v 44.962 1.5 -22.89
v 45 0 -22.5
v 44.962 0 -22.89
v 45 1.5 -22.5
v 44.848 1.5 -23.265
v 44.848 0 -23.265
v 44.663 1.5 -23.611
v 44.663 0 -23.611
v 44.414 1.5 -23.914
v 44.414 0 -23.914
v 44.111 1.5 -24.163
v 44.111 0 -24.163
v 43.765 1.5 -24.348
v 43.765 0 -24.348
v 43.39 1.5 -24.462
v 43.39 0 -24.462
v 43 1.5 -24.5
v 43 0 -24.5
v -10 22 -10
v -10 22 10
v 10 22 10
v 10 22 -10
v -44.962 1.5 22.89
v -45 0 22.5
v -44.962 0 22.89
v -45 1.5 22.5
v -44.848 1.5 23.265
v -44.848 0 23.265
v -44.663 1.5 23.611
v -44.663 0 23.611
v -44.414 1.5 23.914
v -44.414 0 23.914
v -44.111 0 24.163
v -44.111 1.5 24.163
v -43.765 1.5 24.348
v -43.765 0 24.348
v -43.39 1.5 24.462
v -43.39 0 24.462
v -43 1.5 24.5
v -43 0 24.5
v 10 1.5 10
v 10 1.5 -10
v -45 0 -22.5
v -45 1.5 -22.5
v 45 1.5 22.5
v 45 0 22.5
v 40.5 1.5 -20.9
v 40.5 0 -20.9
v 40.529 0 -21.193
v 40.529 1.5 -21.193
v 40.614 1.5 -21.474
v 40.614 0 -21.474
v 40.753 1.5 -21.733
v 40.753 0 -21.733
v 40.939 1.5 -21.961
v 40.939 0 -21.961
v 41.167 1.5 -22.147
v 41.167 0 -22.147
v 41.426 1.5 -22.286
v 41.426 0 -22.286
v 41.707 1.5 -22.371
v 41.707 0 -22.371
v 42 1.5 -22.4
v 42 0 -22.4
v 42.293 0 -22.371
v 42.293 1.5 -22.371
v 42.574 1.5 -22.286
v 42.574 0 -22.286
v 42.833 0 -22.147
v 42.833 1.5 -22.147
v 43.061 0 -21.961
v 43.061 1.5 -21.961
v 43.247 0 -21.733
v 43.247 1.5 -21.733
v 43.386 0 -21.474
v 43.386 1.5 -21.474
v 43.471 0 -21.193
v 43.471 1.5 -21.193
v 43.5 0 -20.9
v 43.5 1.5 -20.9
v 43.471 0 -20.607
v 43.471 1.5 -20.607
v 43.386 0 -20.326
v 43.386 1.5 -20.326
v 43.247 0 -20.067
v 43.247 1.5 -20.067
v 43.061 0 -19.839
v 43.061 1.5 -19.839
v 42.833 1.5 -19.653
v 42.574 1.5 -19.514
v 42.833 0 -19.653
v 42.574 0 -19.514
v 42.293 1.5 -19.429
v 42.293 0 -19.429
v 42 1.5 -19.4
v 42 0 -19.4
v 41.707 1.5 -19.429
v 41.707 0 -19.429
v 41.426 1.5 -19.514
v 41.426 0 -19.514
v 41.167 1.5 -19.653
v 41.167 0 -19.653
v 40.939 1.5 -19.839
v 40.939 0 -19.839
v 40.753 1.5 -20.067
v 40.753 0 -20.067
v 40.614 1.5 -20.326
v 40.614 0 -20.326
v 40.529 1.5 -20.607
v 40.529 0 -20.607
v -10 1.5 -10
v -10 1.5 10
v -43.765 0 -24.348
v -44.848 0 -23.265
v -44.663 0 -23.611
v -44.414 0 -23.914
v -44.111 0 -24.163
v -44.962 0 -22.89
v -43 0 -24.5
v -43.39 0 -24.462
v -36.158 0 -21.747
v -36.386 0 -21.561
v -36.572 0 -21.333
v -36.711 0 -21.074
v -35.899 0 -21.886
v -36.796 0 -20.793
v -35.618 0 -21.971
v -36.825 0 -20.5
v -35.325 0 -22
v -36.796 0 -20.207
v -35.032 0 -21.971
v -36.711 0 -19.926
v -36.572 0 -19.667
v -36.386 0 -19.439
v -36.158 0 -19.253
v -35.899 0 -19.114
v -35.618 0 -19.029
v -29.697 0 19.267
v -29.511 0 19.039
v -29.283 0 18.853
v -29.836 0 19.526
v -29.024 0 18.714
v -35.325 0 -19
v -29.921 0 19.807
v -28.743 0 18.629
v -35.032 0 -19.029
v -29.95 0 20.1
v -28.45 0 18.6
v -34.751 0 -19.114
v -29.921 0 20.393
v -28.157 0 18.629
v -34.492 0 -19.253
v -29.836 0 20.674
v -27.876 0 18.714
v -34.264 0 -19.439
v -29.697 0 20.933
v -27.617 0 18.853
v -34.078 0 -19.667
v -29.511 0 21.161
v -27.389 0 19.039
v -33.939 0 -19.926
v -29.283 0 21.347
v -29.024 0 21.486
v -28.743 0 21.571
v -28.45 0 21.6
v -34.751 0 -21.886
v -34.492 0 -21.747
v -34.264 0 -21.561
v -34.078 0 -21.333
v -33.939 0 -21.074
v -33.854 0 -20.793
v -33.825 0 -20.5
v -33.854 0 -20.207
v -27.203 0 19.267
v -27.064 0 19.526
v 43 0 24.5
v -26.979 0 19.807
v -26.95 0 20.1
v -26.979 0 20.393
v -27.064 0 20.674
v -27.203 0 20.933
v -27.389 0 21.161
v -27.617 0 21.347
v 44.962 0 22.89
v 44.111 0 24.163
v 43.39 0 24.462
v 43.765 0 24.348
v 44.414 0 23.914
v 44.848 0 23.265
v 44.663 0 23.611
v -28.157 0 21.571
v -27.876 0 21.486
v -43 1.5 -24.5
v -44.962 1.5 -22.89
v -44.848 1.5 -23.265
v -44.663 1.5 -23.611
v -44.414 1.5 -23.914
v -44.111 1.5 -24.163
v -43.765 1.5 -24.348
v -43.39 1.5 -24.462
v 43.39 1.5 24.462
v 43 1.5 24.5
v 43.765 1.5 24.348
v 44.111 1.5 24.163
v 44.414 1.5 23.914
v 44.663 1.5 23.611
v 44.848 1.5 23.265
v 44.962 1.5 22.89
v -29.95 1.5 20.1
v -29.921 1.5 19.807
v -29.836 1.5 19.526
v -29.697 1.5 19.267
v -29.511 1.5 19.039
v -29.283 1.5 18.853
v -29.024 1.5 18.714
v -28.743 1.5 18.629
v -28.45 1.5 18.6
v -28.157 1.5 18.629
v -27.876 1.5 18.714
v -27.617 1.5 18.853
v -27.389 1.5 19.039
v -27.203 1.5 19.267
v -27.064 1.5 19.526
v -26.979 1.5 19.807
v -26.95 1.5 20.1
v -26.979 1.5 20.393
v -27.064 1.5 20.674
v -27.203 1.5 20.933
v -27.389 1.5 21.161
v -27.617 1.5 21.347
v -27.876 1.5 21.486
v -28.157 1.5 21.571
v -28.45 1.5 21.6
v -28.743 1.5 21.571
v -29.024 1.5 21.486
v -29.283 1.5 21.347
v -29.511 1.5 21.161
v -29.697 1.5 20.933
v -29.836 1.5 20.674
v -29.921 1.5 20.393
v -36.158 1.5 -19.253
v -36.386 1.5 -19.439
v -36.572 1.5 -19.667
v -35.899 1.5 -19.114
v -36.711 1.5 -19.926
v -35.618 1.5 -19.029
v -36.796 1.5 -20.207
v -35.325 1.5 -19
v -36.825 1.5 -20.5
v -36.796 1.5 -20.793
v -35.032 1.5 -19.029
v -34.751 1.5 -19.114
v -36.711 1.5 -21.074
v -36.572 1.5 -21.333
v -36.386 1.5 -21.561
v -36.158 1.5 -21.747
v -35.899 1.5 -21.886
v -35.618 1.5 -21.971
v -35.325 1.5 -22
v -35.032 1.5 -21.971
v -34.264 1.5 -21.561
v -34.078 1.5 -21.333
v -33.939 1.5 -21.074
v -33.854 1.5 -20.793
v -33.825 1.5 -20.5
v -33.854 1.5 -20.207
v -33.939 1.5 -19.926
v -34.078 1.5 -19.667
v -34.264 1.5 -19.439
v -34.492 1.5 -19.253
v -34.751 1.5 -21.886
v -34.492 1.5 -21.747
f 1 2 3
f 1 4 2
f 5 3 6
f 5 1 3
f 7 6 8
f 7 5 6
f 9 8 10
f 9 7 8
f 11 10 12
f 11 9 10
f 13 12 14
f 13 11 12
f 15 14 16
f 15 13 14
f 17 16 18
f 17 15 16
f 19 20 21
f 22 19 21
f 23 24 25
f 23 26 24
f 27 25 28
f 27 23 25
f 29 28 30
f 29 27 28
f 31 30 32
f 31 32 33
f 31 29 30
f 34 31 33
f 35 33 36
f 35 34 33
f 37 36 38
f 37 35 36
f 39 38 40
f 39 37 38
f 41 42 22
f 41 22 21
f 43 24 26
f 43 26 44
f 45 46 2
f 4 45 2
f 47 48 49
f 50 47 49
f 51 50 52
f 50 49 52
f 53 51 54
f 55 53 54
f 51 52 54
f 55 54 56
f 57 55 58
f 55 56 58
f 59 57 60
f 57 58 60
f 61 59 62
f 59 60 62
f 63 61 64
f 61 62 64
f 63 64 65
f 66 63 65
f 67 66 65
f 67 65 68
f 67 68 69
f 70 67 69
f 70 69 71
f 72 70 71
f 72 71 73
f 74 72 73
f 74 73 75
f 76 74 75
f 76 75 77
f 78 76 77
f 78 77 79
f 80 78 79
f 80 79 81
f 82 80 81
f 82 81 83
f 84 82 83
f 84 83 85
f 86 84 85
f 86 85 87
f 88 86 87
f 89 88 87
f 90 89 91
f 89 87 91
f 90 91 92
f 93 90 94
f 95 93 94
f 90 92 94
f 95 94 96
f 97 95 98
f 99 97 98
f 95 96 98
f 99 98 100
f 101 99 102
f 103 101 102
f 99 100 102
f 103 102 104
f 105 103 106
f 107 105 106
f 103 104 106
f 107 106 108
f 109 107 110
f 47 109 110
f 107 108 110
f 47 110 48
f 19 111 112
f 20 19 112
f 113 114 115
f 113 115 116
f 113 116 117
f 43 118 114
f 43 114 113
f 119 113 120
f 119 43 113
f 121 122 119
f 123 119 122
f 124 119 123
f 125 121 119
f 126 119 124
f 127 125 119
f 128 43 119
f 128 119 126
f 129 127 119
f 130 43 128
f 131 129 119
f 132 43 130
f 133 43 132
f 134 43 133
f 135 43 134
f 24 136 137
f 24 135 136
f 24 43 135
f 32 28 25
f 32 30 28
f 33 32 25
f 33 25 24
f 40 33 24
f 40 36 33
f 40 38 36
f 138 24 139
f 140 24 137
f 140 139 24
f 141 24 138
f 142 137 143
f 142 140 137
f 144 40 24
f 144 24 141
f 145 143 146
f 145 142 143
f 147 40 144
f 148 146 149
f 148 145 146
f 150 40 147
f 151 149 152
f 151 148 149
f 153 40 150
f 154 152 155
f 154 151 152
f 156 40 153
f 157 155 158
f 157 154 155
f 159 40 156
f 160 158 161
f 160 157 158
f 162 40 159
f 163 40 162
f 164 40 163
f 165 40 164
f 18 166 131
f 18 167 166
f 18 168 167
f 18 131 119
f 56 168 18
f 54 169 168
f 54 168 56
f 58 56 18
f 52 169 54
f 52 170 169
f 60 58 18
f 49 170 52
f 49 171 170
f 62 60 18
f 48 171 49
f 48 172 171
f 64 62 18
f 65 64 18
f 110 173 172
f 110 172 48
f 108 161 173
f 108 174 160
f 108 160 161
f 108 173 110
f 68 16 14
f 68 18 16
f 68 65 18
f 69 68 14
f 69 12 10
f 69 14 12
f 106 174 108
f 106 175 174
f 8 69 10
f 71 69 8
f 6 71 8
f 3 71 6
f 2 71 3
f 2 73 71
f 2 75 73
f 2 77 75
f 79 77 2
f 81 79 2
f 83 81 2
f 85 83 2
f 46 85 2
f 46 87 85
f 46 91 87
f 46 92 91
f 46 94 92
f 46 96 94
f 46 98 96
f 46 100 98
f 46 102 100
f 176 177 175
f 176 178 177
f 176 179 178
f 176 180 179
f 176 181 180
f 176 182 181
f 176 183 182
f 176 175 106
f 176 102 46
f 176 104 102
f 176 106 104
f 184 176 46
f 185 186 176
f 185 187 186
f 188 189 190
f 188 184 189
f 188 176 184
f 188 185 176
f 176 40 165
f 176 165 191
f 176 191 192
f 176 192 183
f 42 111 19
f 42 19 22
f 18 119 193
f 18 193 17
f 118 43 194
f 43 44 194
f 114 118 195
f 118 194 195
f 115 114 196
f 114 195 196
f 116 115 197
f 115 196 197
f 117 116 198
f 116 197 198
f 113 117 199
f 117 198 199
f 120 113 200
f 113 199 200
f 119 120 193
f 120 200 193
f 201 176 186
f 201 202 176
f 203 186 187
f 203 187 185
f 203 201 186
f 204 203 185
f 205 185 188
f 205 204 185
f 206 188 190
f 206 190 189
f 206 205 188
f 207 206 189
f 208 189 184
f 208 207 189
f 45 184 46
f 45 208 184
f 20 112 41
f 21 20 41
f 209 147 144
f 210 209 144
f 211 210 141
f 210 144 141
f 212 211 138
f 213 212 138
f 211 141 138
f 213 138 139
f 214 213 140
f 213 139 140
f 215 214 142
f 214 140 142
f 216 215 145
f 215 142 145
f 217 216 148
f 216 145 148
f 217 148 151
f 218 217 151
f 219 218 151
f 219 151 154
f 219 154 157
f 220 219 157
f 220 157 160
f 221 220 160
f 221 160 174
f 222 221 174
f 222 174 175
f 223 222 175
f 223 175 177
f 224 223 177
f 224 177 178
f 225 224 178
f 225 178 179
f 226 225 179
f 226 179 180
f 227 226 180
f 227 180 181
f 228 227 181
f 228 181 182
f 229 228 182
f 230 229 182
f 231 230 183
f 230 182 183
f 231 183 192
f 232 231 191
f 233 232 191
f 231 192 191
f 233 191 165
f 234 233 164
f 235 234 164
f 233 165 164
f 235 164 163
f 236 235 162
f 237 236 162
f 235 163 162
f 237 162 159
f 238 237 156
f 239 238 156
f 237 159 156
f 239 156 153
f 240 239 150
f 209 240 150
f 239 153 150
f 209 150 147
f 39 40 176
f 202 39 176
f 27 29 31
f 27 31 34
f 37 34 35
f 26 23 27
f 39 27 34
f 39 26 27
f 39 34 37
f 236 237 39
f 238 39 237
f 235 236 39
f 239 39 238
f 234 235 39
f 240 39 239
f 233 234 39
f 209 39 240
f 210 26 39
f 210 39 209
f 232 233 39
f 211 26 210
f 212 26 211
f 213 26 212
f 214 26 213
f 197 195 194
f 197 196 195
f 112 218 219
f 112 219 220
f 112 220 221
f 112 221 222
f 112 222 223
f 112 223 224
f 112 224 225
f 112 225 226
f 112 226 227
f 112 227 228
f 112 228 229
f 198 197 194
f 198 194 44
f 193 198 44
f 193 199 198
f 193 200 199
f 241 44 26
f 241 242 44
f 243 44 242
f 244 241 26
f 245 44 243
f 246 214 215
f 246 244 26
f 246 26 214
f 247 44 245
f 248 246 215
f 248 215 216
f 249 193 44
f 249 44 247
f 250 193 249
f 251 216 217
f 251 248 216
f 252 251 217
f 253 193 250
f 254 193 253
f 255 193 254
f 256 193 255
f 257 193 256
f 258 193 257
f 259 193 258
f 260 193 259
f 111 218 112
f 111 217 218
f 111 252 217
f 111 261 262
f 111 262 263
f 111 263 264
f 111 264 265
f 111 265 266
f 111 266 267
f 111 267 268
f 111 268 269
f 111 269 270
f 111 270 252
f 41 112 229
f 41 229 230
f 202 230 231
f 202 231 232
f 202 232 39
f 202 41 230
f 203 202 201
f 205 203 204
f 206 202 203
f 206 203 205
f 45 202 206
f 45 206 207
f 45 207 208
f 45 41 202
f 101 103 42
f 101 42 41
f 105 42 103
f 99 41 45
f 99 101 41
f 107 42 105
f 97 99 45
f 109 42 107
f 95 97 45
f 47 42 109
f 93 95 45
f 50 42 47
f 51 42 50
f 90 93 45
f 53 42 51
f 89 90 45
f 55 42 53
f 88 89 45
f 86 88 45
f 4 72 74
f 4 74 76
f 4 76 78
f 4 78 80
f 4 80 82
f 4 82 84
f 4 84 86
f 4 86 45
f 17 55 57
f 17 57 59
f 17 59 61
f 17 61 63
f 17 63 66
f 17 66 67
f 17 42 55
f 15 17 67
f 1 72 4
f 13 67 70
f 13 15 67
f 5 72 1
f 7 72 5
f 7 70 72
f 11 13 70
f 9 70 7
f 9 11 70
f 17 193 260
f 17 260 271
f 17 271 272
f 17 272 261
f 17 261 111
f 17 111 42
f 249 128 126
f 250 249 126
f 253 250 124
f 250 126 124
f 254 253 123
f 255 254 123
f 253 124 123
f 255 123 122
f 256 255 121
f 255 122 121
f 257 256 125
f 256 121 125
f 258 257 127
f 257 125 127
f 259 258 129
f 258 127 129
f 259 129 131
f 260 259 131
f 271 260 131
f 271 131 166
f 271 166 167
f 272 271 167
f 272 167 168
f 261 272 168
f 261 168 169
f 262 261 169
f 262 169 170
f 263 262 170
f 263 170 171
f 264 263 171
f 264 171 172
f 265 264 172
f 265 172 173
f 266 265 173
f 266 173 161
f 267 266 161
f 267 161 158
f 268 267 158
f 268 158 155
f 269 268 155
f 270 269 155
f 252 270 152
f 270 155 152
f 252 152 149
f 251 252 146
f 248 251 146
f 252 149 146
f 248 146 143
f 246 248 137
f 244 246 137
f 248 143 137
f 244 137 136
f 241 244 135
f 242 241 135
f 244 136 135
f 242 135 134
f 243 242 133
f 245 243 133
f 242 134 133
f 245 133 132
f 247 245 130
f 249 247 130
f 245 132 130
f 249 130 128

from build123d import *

# Parameters (mm, degrees)
SKETCH1_W             = 90
SKETCH1_H             = 49
BOSS_EXTRUDE1_DEPTH   = 1.5
FILLET1_R             = 2
F_1_0MM_DOWEL_HOLE1_D = 3
SKETCH4_W             = 20
SKETCH4_H             = 20
BOSS_EXTRUDE2_DEPTH   = 22


with BuildPart() as part:
    # Sketch1 → Boss-Extrude1 (new body)
    with BuildSketch(Plane(origin=(0, 0, 0), x_dir=(1, 0, 0), z_dir=(0, 1, 0))):
        Rectangle(SKETCH1_W, SKETCH1_H)
    extrude(amount=BOSS_EXTRUDE1_DEPTH)

    # Fillet1
    fillet1_edges = [part.edges().sort_by_distance(p)[0] for p in [
        (45, 0.75, 24.5),
        (-45, 0.75, 24.5),
        (-45, 0.75, -24.5),
        (45, 0.75, -24.5),
    ]]
    fillet(fillet1_edges, radius=FILLET1_R)

    # Ø1.0mm Dowel Hole1 (through all)
    with Locations(Plane(origin=(0, 1.5, 0), x_dir=(1, 0, 0), z_dir=(0, 1, 0))):
        with Locations((-35.325, 20.5), (42, 20.9), (-28.45, -20.1)):
            Hole(F_1_0MM_DOWEL_HOLE1_D / 2)

    # Sketch4 → Boss-Extrude2 (add)
    with BuildSketch(Plane.XZ):
        Rectangle(SKETCH4_W, SKETCH4_H)
    extrude(amount=-BOSS_EXTRUDE2_DEPTH)


solid = part.part
